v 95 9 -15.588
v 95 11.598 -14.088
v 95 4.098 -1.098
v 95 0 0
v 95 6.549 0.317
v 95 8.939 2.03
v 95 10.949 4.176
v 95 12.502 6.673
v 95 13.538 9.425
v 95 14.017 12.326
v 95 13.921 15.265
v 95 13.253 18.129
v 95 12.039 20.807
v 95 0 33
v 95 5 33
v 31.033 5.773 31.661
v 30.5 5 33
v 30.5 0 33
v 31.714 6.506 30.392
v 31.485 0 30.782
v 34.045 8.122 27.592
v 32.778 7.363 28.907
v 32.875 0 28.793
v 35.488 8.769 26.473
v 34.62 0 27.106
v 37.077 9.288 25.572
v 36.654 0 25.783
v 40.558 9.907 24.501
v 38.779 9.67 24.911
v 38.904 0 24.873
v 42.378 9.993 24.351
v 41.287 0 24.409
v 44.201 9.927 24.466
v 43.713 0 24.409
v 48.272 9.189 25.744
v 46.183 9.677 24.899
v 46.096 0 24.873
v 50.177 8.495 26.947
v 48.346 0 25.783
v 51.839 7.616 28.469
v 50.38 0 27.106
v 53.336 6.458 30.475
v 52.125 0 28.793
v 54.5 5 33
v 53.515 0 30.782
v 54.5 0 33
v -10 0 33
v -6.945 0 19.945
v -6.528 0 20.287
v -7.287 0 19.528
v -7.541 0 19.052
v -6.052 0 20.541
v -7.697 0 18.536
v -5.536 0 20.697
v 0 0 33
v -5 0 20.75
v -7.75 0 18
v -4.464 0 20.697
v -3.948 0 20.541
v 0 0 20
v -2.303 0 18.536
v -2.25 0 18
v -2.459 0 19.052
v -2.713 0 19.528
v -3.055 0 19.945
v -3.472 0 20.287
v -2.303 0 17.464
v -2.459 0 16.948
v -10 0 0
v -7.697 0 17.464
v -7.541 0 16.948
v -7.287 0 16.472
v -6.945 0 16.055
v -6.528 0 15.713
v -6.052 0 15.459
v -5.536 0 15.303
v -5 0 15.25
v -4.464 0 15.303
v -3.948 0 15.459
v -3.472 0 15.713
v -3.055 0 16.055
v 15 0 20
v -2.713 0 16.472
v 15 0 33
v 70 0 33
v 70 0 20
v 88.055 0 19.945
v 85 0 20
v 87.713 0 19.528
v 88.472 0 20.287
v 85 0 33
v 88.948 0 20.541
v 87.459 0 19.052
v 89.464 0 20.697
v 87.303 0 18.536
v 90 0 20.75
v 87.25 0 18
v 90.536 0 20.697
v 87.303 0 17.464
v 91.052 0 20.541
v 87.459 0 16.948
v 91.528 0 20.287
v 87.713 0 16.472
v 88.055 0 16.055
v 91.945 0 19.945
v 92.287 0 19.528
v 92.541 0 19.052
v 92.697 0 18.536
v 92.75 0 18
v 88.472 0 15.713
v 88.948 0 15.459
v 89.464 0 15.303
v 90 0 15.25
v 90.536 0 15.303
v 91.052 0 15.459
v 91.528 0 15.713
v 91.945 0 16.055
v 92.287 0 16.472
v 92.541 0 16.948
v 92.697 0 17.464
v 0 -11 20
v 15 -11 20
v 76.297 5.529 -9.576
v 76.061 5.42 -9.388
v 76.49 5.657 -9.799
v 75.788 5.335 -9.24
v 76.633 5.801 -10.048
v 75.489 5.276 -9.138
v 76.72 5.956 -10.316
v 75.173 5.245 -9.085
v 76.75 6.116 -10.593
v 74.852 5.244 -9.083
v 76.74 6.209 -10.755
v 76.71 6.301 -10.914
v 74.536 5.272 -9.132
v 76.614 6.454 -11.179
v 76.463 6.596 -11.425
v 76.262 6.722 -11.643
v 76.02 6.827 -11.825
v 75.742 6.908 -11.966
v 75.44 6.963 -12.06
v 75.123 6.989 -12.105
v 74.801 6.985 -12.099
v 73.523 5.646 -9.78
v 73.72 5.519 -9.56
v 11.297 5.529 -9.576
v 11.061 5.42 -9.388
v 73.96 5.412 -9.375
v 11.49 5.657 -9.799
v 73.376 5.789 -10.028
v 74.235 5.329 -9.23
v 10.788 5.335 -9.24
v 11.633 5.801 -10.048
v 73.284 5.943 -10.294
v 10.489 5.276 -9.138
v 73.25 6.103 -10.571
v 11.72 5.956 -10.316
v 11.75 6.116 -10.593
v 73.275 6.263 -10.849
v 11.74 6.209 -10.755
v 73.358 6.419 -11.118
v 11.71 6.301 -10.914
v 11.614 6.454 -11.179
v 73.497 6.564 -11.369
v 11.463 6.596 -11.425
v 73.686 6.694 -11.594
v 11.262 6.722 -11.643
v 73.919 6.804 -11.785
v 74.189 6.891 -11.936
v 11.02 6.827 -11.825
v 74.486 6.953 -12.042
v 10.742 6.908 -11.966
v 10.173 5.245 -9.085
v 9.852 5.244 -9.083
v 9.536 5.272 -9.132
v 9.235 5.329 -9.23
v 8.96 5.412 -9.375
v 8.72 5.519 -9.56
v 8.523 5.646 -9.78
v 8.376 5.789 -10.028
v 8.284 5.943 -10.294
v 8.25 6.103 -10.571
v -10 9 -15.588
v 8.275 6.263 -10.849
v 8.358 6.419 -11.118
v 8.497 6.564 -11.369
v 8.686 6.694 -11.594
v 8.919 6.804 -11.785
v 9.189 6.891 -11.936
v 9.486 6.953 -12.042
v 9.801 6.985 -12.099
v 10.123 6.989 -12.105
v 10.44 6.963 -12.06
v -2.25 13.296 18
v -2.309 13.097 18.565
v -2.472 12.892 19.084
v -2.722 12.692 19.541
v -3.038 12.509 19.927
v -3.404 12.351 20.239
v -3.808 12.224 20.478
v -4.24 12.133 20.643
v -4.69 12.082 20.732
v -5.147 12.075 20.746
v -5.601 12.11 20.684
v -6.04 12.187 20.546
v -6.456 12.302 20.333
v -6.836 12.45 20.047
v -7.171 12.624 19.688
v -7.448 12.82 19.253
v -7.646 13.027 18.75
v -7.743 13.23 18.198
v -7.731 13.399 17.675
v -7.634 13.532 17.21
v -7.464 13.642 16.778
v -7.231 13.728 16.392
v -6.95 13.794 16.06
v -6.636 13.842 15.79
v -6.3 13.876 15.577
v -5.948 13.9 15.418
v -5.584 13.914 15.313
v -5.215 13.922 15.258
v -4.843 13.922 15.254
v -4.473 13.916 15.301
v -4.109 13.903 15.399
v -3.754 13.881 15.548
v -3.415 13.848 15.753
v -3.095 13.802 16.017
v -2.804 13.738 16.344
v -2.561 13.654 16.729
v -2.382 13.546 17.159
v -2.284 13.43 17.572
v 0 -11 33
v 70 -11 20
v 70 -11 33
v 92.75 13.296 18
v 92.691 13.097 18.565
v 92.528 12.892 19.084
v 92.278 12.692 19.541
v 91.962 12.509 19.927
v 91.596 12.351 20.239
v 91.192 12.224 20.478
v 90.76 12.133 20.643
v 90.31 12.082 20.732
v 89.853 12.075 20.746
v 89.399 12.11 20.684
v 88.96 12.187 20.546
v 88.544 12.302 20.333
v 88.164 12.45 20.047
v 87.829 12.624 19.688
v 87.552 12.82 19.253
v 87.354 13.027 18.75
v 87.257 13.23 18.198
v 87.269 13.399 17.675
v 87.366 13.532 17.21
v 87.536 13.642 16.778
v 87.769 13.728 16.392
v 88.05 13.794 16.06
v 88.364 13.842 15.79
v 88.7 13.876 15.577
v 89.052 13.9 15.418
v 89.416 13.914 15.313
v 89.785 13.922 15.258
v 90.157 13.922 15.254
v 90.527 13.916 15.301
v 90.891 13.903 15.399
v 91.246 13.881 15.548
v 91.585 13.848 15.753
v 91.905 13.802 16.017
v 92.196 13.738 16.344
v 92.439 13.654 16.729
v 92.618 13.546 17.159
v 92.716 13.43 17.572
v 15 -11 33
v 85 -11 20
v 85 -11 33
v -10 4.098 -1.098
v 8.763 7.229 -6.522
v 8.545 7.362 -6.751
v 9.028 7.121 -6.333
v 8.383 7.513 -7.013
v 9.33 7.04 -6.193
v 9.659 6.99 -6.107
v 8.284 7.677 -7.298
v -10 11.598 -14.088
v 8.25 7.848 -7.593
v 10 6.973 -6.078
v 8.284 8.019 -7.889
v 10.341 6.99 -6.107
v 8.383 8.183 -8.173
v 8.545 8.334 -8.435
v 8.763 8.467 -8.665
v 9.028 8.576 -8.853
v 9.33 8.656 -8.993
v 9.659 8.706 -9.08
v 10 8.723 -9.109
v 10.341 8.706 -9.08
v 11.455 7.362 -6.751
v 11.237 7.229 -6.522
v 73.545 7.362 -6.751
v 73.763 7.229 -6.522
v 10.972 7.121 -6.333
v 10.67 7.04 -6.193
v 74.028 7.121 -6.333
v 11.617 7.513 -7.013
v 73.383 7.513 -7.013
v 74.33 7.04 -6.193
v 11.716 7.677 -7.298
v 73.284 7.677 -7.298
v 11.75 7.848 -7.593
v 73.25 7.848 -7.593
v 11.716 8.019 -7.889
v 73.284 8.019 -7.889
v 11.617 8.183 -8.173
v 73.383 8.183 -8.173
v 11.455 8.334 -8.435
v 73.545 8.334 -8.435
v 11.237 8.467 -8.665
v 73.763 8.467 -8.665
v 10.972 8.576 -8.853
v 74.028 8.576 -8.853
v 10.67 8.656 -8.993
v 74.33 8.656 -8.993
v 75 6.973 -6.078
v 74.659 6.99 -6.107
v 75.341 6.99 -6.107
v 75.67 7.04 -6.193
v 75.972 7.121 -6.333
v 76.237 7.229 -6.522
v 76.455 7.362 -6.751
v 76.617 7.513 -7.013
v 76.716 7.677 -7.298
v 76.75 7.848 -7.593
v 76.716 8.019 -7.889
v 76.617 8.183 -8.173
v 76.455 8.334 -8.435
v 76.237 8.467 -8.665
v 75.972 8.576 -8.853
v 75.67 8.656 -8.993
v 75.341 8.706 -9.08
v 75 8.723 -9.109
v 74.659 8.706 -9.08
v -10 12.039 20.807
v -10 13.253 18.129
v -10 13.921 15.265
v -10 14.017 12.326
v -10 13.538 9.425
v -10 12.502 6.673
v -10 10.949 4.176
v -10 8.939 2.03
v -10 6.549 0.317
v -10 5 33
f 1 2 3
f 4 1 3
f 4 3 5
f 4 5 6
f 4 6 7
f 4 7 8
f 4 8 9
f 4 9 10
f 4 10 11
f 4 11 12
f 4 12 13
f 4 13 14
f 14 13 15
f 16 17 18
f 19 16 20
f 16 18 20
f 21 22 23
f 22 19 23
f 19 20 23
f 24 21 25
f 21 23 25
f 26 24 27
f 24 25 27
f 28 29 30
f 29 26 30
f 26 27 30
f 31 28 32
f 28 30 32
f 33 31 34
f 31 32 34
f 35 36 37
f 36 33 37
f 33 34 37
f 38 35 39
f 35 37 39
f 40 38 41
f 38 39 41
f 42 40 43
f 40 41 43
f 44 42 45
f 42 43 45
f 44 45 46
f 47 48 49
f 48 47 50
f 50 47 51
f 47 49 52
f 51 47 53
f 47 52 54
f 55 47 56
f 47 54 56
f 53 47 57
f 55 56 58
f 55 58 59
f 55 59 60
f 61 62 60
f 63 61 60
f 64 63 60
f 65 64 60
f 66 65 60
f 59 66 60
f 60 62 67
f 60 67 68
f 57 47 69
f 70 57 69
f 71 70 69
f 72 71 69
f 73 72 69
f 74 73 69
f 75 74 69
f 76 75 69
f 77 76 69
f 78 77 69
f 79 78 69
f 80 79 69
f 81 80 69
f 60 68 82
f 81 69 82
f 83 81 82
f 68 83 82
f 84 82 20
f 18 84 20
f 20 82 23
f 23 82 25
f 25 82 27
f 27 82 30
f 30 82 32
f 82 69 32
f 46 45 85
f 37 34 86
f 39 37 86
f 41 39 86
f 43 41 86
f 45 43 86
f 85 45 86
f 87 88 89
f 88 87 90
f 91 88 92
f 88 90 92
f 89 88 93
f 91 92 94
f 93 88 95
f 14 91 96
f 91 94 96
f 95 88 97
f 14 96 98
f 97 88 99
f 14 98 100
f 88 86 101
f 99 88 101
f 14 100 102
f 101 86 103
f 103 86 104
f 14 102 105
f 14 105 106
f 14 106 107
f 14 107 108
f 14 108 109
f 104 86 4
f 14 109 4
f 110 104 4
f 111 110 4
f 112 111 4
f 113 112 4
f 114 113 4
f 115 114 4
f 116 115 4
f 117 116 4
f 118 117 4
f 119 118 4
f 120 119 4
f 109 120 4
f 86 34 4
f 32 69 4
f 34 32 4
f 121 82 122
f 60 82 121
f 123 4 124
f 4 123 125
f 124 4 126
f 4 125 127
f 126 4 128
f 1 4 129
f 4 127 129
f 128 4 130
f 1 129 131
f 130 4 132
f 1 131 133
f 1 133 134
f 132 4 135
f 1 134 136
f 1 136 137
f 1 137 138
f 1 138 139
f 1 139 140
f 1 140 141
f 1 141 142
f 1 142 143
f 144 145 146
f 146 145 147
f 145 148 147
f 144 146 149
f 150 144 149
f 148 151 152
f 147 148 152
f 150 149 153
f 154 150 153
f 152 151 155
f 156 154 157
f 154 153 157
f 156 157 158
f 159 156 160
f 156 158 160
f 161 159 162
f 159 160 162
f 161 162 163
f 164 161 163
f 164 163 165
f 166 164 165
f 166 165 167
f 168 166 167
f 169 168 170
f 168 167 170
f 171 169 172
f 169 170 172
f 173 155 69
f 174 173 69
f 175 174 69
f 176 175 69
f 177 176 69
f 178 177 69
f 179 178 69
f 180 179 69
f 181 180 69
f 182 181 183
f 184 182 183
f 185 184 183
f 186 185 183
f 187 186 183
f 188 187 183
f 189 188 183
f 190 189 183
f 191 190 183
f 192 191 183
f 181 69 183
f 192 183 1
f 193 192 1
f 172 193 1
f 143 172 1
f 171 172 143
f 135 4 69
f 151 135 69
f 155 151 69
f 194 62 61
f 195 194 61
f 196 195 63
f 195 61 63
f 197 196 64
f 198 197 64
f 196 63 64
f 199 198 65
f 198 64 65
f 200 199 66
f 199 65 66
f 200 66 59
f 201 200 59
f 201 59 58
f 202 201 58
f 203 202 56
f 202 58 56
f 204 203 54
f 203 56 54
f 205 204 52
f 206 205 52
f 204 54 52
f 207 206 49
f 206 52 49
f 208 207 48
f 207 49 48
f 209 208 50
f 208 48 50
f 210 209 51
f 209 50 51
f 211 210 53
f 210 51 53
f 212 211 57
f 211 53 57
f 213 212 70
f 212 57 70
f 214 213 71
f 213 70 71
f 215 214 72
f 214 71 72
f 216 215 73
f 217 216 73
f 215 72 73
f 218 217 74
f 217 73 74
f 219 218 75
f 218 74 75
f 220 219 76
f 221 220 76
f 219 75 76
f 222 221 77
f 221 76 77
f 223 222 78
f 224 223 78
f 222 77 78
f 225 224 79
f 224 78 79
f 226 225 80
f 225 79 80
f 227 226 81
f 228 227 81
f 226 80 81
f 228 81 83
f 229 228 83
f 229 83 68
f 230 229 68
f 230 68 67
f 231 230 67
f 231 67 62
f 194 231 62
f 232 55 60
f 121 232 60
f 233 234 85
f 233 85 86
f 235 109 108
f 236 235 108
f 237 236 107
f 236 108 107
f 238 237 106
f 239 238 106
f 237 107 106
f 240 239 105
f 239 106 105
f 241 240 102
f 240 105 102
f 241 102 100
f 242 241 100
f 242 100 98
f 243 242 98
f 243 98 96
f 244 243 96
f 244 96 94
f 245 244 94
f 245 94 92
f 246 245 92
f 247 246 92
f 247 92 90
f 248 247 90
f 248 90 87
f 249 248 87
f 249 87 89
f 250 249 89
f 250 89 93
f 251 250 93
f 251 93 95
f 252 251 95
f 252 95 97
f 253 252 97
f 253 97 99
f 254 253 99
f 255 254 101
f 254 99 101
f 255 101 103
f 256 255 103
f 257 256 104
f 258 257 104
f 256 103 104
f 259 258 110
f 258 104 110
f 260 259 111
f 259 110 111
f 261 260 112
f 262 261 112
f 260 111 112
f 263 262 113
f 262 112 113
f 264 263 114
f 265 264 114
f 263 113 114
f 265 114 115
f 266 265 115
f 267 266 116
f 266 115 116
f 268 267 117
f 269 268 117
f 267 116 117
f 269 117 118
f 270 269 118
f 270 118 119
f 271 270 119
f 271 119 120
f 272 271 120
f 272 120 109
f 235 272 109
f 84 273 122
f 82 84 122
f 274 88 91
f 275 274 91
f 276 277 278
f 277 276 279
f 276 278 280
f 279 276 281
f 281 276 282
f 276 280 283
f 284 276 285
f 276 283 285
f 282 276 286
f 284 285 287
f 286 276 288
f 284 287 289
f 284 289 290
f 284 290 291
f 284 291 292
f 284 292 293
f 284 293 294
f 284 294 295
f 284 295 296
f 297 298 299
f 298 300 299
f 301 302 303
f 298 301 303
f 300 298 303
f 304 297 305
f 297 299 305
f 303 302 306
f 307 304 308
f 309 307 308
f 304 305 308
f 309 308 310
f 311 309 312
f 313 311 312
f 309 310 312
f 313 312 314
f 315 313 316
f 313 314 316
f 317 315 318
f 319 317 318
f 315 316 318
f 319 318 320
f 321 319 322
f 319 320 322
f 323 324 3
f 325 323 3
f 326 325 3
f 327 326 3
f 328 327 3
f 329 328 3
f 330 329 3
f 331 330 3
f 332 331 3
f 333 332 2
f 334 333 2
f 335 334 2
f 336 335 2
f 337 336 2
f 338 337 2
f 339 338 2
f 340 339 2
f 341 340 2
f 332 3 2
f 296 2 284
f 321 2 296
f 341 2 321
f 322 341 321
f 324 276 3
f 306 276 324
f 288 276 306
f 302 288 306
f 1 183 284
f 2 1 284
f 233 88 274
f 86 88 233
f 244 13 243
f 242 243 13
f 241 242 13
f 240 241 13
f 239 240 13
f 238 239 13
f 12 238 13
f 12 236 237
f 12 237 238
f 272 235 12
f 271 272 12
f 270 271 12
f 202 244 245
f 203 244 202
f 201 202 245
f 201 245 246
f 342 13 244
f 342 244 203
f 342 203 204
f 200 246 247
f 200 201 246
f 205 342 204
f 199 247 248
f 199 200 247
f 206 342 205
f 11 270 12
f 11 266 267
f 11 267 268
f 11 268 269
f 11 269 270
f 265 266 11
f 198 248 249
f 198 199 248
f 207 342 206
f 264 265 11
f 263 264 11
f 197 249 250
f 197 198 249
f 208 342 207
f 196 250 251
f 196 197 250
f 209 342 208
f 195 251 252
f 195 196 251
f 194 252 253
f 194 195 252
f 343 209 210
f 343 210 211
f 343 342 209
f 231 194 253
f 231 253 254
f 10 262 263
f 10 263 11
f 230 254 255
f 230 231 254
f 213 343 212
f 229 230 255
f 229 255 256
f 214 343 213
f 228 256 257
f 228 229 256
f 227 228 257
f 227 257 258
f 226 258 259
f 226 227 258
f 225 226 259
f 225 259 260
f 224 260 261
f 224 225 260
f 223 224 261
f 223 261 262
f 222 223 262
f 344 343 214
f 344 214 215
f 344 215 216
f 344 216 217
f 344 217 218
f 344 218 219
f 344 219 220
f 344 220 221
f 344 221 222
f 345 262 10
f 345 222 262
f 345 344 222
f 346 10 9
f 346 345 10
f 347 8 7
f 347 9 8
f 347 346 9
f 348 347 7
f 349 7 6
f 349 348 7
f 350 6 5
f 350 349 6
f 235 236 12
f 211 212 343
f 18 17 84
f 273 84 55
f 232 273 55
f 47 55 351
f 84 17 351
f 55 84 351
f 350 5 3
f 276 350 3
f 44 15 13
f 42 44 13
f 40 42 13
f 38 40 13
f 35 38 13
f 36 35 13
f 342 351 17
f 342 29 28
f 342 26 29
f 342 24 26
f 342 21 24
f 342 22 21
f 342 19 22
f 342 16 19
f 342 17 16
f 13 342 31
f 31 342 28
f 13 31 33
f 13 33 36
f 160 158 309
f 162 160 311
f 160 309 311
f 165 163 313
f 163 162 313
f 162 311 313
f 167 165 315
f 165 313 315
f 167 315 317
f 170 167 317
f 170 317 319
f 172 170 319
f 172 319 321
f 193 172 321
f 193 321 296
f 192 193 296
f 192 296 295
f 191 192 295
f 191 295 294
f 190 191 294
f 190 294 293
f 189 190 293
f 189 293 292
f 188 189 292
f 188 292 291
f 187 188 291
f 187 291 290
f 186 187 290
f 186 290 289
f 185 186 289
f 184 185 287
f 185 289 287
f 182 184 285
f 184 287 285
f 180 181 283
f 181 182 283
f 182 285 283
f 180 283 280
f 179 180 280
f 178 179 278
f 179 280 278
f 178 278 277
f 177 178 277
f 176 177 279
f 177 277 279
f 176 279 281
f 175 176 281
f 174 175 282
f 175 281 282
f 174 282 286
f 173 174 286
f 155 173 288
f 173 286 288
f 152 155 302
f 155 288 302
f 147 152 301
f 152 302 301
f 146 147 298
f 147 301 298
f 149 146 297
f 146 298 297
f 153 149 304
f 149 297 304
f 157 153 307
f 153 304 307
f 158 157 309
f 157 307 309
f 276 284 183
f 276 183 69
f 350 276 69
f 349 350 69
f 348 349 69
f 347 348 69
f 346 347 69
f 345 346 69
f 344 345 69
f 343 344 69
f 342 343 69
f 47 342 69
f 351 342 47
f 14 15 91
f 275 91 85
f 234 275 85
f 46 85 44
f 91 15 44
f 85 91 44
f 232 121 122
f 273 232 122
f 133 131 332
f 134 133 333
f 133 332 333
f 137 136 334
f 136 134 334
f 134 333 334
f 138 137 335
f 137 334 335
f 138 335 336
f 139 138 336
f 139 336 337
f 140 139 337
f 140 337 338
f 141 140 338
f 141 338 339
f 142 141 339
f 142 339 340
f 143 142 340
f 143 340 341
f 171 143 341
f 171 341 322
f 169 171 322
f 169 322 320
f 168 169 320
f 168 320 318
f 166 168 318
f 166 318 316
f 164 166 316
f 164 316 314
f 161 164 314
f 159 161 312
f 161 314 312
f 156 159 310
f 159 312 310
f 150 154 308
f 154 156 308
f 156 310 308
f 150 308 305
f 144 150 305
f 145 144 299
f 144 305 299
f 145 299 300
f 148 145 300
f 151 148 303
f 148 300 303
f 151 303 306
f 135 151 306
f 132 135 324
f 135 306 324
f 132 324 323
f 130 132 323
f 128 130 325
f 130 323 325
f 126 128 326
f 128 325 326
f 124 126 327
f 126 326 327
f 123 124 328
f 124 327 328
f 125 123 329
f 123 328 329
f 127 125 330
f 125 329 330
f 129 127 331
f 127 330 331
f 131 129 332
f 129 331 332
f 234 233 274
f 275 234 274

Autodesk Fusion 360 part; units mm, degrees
sketch "Sketch1" plane through (0, 0, 0) normal (0, 1, 0) x (1, 0, 0)
  line L0 (0, 0) -> (85, 0)
  line L1 (85, 0) -> (85, -33)
  line L2 (85, -33) -> (0, -33)
  line L3 (0, -33) -> (0, 0)
  line L4 (0, 0) -> (85, 0)
  line L5 (85, 0) -> (85, -20)
  line L6 (85, -20) -> (0, -20)
  line L7 (0, -20) -> (0, 0)
  dimension "d1" = 85
  dimension "d2" = 33
  dimension "d3" = 20
extrude "Extrude1" add sketch "Sketch1" along normal blind 5
extrude "Extrude2" add sketch "Sketch1" against normal blind 11 contours L1 L2 L3 L6
sketch "Sketch2" plane through (0, -11, 0) normal (0, -1, 0) x (1, 0, 0)
  line L0 (85, 20) -> (85, 33)
  line L1 (85, 33) -> (0, 33)
  line L2 (0, 33) -> (0, 20)
  line L3 (0, 20) -> (85, 20)
  line L4 (0, 33) -> (15, 33)
  line L5 (15, 33) -> (15, 20)
  line L6 (15, 20) -> (0, 20)
  line L7 (0, 20) -> (0, 33)
  line L8 (85, 33) -> (70, 33)
  line L9 (70, 33) -> (70, 20)
  line L10 (70, 20) -> (85, 20)
  line L11 (85, 20) -> (85, 33)
  dimension "d8" = 15
extrude "Extrude3" cut sketch "Sketch2" against normal blind 11 contours L1 L3 L5 L9
sketch "Sketch3" plane through (0, 5, 0) normal (0, 1, 0) x (-1, 0, 0)
  line L0 (0, 0) -> (0, 33)
  line L1 (0, 33) -> (-85, 33)
  line L2 (-85, 33) -> (-85, 0)
  line L3 (-85, 0) -> (0, 0)
  line L4 (-85, 0) -> (-95, 0)
  line L5 (-95, 0) -> (-95, 33)
  line L6 (-95, 33) -> (-85, 33)
  line L7 (-85, 33) -> (-85, 0)
  circle A0 centre (-90, 16.5) radius 2.75 construction
  line L8 (-95, 16.5) -> (-85, 16.5) construction
  line L9 (-42.5, 0) -> (-42.5, 33) construction
  line L10 (0, 0) -> (10, 0)
  line L11 (10, 0) -> (10, 33)
  line L12 (10, 33) -> (0, 33)
  line L13 (0, 33) -> (0, 0)
  circle A1 centre (5, 16.5) radius 2.75 construction
  dimension "d11" = 10
  dimension "d12" = 5.5
extrude "Extrude4" add sketch "Sketch3" against normal blind 5 contours L0 L10 L11 L12 L13 | L2 L4 L5 L6 L7
sketch "Sketch4" plane through (-10, 0, 0) normal (-1, 0, 0) x (0, 0, 1)
  line L0 (33, 5) -> (0, 5)
  line L1 (0, 5) -> (0, 0)
  line L2 (0, 0) -> (33, 0)
  line L3 (33, 0) -> (33, 5)
  line L4 (33, 5) -> (-5.1734, 27.0394)
  line L5 (0, 5) -> (0, 0)
  line L6 (0, 0) -> (-15.5885, 9)
  line L7 (-15.5885, 9) -> (-5.1734, 27.0394)
  dimension "d17" = 30
  dimension "d50" = 18
extrude "Extrude5" add sketch "Sketch4" against normal blind 105 contours L0 L1 L4 L5 L6 L7
sketch "Sketch5" plane through (95, 0, 0) normal (1, 0, 0) x (0, 0, -1)
  line L0 (-33, 5) -> (-33, 0)
  line L1 (-33, 0) -> (0, 0)
  line L2 (0, 0) -> (15.5885, 9)
  line L3 (15.5885, 9) -> (5.1734, 27.0394)
  line L4 (5.1734, 27.0394) -> (-33, 5)
  line L5 (14.0885, 11.5981) -> (5.1734, 27.0394)
  line L6 (5.1734, 27.0394) -> (-7.817, 19.5394)
  line L7 (-7.817, 19.5394) -> (1.0981, 4.0981)
  line L8 (1.0981, 4.0981) -> (14.0885, 11.5981)
  line L9 (0, 0) -> (2.5981, 1.5)
  line L10 (1.0981, 4.0981) -> (2.5981, 1.5) construction
  dimension "d48" = 3
  dimension "d51" = 3
extrude "Extrude7" cut sketch "Sketch5" against normal blind 140 contours L3 L4 L5 L6 L7 L8
sketch "Sketch9" plane through (0, 2.5981, 1.5) normal (0, 0.866025, 0.5) x (1, 0, 0)
  line L0 (-10, 18) -> (-10, 3)
  line L1 (-10, 3) -> (95, 3)
  line L2 (95, 3) -> (95, 18)
  line L3 (95, 18) -> (-10, 18)
  circle A0 centre (10, 10.5) radius 1.75
  circle A1 centre (75, 10.5) radius 1.75
  dimension "d55" = 3.5
  dimension "d56" = 3.5
  dimension "d57" = 7.5
  dimension "d58" = 20
  dimension "d59" = 20
extrude "Extrude11" cut sketch "Sketch9" against normal blind 16 contours A0 | A1
sketch "Sketch8" plane through (0, 0, 0) normal (0, -1, 0) x (1, 0, 0)
  line L0 (85, 20) -> (70, 20)
  line L1 (70, 20) -> (70, 33)
  line L2 (70, 33) -> (15, 33)
  line L3 (15, 33) -> (15, 20)
  line L4 (15, 20) -> (0, 20)
  line L5 (0, 20) -> (0, 33)
  line L6 (0, 33) -> (-10, 33)
  line L7 (-10, 33) -> (-10, 0)
  line L8 (95, 0) -> (95, 33)
  line L9 (95, 33) -> (85, 33)
  line L10 (85, 33) -> (85, 20)
  arc A0 (30.5, 33) -> (54.5, 33) centre (42.5, 37) ccw
  line L11 (42.5, 33) -> (54.5, 33)
  line L12 (42.5, 33) -> (30.5, 33)
  line L13 (42.5, 37) -> (42.5, 33) construction
  line L14 (-10, 0) -> (95, 0)
  dimension "d44" = 12
  dimension "d45" = 4
extrude "Extrude10" cut sketch "Sketch8" against normal blind 25 contours L2 A0 L11 L12
fillet "Fillet2" radius 15 1 edges at (42.5, 19.5394, 7.817)
sketch "Sketch10" plane through (0, 0, 0) normal (0, -1, 0) x (1, 0, 0)
  arc A0 (30.5, 33) -> (54.5, 33) centre (42.5, 37) ccw
  line L0 (30.5, 33) -> (15, 33)
  line L1 (15, 33) -> (15, 20)
  line L2 (15, 20) -> (0, 20)
  line L3 (0, 20) -> (0, 33)
  line L4 (0, 33) -> (-10, 33)
  line L5 (-10, 33) -> (-10, 0)
  line L6 (-10, 0) -> (95, 0)
  line L7 (95, 0) -> (95, 33)
  line L8 (95, 33) -> (85, 33)
  line L9 (85, 33) -> (85, 20)
  line L10 (85, 20) -> (70, 20)
  line L11 (70, 20) -> (70, 33)
  line L12 (70, 33) -> (54.5, 33)
  circle A1 centre (-5, 18) radius 2.75
  circle A2 centre (90, 18) radius 2.75
  dimension "d63" = 5.5
  dimension "d64" = 5.5
  dimension "d65" = 5
  dimension "d66" = 5
  dimension "d67" = 15
extrude "Extrude12" cut sketch "Sketch10" against normal blind 25 contours A1 | A2
